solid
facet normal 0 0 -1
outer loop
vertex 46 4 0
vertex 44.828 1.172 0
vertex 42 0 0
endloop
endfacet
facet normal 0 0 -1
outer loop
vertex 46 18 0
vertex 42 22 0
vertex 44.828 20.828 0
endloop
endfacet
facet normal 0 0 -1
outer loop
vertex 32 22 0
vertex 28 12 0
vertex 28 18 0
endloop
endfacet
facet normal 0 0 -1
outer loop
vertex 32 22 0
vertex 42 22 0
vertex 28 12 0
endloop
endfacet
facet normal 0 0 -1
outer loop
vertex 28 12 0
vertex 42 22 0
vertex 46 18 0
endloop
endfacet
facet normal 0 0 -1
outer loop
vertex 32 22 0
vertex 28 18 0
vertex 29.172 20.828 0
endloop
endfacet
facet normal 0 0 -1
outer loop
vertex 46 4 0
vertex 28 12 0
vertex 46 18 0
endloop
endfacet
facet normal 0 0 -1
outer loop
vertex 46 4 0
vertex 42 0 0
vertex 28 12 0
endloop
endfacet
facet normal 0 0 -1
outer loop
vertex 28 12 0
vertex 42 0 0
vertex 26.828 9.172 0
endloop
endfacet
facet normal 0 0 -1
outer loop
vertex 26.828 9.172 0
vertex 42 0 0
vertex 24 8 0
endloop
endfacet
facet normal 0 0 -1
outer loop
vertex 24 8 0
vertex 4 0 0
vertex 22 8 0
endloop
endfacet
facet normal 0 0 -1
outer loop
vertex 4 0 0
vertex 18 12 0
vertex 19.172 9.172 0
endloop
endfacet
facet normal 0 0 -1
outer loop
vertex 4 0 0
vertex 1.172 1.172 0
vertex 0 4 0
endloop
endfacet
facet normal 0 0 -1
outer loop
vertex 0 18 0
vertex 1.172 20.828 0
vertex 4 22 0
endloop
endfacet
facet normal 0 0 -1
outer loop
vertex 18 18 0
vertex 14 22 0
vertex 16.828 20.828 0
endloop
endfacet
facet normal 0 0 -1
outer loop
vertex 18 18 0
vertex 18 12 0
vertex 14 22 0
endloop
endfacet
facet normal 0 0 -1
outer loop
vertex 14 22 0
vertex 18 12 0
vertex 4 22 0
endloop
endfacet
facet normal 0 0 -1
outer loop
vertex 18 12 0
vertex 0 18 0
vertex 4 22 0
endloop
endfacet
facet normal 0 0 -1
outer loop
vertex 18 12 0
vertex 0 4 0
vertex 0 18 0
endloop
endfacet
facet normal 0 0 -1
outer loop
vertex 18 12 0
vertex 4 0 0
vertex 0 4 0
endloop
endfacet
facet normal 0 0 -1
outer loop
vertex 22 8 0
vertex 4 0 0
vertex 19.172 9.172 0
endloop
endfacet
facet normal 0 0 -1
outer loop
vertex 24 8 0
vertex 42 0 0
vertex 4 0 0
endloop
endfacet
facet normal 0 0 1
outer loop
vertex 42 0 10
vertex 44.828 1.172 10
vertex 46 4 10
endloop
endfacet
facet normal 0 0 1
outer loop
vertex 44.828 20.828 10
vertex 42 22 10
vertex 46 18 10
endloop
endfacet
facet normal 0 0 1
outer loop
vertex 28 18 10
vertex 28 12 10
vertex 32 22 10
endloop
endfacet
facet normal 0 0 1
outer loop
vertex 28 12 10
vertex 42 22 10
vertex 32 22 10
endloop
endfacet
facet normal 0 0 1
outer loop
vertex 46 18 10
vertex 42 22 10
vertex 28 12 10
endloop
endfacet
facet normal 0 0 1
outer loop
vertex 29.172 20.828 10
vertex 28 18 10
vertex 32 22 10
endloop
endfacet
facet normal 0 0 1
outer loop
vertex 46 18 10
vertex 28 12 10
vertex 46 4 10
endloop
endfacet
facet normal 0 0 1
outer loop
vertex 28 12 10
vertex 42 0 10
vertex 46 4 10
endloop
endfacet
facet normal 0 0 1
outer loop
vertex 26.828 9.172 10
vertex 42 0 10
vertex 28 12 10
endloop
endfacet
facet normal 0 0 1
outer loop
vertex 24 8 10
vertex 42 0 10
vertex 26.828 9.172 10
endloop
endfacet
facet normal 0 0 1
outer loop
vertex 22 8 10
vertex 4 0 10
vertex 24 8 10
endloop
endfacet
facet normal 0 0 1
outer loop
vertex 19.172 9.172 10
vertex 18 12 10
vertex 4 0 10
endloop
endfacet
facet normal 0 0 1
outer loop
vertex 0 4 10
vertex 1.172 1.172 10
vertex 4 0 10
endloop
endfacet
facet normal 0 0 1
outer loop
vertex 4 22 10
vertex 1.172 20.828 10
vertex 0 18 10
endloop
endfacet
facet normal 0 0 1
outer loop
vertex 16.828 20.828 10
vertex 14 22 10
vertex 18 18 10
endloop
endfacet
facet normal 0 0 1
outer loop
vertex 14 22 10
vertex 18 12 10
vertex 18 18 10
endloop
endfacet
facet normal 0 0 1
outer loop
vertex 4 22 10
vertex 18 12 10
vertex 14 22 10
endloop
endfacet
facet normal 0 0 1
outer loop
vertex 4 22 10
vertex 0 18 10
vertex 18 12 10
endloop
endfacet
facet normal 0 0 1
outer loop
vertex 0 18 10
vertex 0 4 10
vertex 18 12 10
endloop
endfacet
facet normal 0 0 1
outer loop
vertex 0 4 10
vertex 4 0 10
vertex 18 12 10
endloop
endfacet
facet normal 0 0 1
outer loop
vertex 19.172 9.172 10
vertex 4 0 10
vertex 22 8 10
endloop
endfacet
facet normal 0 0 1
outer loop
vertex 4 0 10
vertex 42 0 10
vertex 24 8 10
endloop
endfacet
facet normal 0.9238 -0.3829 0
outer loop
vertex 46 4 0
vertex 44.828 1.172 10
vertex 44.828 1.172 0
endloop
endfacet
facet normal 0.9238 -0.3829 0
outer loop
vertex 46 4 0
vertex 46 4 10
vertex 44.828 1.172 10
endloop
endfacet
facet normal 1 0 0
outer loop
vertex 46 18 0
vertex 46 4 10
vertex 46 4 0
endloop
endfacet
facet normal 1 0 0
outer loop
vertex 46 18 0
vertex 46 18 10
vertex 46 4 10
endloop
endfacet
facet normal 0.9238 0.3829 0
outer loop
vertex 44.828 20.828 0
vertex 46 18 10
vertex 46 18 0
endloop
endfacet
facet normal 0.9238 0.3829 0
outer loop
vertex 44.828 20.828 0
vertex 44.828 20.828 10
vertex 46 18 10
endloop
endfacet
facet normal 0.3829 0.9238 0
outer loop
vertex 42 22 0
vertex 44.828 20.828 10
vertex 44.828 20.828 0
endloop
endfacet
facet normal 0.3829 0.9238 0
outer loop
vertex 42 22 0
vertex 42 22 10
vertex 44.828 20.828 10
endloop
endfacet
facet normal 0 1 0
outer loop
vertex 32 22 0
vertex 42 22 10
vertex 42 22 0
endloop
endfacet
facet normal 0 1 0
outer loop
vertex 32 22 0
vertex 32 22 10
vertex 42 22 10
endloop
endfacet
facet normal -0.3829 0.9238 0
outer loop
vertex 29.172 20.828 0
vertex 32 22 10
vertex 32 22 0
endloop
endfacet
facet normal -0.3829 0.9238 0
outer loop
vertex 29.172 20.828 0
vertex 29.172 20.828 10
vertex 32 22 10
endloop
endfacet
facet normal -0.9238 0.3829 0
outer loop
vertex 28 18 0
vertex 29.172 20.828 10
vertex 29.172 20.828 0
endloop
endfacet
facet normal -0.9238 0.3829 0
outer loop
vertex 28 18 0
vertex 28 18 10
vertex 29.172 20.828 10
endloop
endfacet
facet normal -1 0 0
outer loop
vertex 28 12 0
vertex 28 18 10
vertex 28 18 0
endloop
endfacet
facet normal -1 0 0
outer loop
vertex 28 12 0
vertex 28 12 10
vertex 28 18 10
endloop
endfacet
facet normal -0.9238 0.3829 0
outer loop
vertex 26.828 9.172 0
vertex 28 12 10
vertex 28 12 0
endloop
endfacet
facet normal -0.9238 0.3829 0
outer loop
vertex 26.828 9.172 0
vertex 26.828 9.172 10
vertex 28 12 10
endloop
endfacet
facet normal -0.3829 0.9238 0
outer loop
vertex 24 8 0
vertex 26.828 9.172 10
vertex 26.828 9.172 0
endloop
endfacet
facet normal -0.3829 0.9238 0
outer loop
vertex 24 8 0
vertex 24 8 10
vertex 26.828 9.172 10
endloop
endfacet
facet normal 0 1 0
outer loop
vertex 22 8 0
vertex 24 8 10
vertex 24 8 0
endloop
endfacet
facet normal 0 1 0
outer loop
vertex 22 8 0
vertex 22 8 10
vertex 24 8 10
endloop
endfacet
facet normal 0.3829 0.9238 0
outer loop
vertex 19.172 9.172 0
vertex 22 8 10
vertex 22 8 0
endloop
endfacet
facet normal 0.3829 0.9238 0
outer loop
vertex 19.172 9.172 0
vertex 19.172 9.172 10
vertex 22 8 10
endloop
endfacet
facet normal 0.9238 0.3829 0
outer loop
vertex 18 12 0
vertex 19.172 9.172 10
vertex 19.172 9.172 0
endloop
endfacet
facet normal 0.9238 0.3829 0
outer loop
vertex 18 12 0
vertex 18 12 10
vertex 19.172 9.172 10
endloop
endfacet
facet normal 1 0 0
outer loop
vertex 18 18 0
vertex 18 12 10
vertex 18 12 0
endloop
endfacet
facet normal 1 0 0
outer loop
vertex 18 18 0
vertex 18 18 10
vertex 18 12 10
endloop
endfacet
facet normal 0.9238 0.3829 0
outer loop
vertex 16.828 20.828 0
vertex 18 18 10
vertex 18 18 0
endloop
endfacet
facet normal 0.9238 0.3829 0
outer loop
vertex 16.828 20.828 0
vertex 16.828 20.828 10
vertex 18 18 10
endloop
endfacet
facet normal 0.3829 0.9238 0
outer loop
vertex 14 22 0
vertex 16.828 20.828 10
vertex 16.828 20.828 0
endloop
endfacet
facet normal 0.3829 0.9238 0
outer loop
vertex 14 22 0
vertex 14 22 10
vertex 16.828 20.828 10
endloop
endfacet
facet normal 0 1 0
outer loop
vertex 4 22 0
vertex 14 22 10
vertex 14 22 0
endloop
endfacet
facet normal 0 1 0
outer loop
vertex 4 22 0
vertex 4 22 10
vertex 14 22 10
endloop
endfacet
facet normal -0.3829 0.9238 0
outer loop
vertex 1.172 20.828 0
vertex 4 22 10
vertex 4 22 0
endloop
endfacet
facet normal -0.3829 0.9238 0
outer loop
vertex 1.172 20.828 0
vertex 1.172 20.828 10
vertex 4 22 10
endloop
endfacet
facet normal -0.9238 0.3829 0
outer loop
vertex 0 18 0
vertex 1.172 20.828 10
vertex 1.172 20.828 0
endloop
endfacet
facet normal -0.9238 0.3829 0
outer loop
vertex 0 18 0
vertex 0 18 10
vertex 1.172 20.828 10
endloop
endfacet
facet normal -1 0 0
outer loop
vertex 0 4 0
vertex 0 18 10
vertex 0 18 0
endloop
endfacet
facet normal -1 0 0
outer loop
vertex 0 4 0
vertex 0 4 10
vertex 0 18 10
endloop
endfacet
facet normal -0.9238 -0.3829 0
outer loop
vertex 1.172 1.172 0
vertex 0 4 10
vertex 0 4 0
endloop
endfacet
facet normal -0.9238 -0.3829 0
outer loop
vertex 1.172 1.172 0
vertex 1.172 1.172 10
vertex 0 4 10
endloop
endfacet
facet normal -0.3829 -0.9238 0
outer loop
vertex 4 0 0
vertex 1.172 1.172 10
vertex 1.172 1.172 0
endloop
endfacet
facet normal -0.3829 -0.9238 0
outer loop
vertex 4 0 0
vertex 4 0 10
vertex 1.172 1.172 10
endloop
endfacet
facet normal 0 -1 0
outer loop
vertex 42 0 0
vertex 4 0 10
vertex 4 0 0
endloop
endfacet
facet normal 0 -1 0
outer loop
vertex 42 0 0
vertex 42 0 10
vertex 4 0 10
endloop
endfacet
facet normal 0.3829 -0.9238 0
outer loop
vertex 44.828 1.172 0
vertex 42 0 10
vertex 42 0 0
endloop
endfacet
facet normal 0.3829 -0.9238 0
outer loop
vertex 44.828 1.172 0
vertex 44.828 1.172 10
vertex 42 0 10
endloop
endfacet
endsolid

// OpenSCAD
$fn = 32;

// ----------------------------------------------------------------------
// Eye lug: clevis, 10 mm thick
// ----------------------------------------------------------------------

// --- parameters (mm) ---
profile_height = 10;      // extrusion height
profile_points = 24;      // points of the closed outline

profile = [[0, 4], [1.172, 1.172], [4, 0], [42, 0], [44.828, 1.172], [46, 4], [46, 18], [44.828, 20.828], [42, 22], [32, 22], [29.172, 20.828], [28, 18], [28, 12], [26.828, 9.172], [24, 8], [22, 8], [19.172, 9.172], [18, 12], [18, 18], [16.828, 20.828], [14, 22], [4, 22], [1.172, 20.828], [0, 18]];  // single closed polygon, 24 points, counter clockwise

// --- the one profile operation ---
linear_extrude(height = profile_height) polygon(points = profile);
